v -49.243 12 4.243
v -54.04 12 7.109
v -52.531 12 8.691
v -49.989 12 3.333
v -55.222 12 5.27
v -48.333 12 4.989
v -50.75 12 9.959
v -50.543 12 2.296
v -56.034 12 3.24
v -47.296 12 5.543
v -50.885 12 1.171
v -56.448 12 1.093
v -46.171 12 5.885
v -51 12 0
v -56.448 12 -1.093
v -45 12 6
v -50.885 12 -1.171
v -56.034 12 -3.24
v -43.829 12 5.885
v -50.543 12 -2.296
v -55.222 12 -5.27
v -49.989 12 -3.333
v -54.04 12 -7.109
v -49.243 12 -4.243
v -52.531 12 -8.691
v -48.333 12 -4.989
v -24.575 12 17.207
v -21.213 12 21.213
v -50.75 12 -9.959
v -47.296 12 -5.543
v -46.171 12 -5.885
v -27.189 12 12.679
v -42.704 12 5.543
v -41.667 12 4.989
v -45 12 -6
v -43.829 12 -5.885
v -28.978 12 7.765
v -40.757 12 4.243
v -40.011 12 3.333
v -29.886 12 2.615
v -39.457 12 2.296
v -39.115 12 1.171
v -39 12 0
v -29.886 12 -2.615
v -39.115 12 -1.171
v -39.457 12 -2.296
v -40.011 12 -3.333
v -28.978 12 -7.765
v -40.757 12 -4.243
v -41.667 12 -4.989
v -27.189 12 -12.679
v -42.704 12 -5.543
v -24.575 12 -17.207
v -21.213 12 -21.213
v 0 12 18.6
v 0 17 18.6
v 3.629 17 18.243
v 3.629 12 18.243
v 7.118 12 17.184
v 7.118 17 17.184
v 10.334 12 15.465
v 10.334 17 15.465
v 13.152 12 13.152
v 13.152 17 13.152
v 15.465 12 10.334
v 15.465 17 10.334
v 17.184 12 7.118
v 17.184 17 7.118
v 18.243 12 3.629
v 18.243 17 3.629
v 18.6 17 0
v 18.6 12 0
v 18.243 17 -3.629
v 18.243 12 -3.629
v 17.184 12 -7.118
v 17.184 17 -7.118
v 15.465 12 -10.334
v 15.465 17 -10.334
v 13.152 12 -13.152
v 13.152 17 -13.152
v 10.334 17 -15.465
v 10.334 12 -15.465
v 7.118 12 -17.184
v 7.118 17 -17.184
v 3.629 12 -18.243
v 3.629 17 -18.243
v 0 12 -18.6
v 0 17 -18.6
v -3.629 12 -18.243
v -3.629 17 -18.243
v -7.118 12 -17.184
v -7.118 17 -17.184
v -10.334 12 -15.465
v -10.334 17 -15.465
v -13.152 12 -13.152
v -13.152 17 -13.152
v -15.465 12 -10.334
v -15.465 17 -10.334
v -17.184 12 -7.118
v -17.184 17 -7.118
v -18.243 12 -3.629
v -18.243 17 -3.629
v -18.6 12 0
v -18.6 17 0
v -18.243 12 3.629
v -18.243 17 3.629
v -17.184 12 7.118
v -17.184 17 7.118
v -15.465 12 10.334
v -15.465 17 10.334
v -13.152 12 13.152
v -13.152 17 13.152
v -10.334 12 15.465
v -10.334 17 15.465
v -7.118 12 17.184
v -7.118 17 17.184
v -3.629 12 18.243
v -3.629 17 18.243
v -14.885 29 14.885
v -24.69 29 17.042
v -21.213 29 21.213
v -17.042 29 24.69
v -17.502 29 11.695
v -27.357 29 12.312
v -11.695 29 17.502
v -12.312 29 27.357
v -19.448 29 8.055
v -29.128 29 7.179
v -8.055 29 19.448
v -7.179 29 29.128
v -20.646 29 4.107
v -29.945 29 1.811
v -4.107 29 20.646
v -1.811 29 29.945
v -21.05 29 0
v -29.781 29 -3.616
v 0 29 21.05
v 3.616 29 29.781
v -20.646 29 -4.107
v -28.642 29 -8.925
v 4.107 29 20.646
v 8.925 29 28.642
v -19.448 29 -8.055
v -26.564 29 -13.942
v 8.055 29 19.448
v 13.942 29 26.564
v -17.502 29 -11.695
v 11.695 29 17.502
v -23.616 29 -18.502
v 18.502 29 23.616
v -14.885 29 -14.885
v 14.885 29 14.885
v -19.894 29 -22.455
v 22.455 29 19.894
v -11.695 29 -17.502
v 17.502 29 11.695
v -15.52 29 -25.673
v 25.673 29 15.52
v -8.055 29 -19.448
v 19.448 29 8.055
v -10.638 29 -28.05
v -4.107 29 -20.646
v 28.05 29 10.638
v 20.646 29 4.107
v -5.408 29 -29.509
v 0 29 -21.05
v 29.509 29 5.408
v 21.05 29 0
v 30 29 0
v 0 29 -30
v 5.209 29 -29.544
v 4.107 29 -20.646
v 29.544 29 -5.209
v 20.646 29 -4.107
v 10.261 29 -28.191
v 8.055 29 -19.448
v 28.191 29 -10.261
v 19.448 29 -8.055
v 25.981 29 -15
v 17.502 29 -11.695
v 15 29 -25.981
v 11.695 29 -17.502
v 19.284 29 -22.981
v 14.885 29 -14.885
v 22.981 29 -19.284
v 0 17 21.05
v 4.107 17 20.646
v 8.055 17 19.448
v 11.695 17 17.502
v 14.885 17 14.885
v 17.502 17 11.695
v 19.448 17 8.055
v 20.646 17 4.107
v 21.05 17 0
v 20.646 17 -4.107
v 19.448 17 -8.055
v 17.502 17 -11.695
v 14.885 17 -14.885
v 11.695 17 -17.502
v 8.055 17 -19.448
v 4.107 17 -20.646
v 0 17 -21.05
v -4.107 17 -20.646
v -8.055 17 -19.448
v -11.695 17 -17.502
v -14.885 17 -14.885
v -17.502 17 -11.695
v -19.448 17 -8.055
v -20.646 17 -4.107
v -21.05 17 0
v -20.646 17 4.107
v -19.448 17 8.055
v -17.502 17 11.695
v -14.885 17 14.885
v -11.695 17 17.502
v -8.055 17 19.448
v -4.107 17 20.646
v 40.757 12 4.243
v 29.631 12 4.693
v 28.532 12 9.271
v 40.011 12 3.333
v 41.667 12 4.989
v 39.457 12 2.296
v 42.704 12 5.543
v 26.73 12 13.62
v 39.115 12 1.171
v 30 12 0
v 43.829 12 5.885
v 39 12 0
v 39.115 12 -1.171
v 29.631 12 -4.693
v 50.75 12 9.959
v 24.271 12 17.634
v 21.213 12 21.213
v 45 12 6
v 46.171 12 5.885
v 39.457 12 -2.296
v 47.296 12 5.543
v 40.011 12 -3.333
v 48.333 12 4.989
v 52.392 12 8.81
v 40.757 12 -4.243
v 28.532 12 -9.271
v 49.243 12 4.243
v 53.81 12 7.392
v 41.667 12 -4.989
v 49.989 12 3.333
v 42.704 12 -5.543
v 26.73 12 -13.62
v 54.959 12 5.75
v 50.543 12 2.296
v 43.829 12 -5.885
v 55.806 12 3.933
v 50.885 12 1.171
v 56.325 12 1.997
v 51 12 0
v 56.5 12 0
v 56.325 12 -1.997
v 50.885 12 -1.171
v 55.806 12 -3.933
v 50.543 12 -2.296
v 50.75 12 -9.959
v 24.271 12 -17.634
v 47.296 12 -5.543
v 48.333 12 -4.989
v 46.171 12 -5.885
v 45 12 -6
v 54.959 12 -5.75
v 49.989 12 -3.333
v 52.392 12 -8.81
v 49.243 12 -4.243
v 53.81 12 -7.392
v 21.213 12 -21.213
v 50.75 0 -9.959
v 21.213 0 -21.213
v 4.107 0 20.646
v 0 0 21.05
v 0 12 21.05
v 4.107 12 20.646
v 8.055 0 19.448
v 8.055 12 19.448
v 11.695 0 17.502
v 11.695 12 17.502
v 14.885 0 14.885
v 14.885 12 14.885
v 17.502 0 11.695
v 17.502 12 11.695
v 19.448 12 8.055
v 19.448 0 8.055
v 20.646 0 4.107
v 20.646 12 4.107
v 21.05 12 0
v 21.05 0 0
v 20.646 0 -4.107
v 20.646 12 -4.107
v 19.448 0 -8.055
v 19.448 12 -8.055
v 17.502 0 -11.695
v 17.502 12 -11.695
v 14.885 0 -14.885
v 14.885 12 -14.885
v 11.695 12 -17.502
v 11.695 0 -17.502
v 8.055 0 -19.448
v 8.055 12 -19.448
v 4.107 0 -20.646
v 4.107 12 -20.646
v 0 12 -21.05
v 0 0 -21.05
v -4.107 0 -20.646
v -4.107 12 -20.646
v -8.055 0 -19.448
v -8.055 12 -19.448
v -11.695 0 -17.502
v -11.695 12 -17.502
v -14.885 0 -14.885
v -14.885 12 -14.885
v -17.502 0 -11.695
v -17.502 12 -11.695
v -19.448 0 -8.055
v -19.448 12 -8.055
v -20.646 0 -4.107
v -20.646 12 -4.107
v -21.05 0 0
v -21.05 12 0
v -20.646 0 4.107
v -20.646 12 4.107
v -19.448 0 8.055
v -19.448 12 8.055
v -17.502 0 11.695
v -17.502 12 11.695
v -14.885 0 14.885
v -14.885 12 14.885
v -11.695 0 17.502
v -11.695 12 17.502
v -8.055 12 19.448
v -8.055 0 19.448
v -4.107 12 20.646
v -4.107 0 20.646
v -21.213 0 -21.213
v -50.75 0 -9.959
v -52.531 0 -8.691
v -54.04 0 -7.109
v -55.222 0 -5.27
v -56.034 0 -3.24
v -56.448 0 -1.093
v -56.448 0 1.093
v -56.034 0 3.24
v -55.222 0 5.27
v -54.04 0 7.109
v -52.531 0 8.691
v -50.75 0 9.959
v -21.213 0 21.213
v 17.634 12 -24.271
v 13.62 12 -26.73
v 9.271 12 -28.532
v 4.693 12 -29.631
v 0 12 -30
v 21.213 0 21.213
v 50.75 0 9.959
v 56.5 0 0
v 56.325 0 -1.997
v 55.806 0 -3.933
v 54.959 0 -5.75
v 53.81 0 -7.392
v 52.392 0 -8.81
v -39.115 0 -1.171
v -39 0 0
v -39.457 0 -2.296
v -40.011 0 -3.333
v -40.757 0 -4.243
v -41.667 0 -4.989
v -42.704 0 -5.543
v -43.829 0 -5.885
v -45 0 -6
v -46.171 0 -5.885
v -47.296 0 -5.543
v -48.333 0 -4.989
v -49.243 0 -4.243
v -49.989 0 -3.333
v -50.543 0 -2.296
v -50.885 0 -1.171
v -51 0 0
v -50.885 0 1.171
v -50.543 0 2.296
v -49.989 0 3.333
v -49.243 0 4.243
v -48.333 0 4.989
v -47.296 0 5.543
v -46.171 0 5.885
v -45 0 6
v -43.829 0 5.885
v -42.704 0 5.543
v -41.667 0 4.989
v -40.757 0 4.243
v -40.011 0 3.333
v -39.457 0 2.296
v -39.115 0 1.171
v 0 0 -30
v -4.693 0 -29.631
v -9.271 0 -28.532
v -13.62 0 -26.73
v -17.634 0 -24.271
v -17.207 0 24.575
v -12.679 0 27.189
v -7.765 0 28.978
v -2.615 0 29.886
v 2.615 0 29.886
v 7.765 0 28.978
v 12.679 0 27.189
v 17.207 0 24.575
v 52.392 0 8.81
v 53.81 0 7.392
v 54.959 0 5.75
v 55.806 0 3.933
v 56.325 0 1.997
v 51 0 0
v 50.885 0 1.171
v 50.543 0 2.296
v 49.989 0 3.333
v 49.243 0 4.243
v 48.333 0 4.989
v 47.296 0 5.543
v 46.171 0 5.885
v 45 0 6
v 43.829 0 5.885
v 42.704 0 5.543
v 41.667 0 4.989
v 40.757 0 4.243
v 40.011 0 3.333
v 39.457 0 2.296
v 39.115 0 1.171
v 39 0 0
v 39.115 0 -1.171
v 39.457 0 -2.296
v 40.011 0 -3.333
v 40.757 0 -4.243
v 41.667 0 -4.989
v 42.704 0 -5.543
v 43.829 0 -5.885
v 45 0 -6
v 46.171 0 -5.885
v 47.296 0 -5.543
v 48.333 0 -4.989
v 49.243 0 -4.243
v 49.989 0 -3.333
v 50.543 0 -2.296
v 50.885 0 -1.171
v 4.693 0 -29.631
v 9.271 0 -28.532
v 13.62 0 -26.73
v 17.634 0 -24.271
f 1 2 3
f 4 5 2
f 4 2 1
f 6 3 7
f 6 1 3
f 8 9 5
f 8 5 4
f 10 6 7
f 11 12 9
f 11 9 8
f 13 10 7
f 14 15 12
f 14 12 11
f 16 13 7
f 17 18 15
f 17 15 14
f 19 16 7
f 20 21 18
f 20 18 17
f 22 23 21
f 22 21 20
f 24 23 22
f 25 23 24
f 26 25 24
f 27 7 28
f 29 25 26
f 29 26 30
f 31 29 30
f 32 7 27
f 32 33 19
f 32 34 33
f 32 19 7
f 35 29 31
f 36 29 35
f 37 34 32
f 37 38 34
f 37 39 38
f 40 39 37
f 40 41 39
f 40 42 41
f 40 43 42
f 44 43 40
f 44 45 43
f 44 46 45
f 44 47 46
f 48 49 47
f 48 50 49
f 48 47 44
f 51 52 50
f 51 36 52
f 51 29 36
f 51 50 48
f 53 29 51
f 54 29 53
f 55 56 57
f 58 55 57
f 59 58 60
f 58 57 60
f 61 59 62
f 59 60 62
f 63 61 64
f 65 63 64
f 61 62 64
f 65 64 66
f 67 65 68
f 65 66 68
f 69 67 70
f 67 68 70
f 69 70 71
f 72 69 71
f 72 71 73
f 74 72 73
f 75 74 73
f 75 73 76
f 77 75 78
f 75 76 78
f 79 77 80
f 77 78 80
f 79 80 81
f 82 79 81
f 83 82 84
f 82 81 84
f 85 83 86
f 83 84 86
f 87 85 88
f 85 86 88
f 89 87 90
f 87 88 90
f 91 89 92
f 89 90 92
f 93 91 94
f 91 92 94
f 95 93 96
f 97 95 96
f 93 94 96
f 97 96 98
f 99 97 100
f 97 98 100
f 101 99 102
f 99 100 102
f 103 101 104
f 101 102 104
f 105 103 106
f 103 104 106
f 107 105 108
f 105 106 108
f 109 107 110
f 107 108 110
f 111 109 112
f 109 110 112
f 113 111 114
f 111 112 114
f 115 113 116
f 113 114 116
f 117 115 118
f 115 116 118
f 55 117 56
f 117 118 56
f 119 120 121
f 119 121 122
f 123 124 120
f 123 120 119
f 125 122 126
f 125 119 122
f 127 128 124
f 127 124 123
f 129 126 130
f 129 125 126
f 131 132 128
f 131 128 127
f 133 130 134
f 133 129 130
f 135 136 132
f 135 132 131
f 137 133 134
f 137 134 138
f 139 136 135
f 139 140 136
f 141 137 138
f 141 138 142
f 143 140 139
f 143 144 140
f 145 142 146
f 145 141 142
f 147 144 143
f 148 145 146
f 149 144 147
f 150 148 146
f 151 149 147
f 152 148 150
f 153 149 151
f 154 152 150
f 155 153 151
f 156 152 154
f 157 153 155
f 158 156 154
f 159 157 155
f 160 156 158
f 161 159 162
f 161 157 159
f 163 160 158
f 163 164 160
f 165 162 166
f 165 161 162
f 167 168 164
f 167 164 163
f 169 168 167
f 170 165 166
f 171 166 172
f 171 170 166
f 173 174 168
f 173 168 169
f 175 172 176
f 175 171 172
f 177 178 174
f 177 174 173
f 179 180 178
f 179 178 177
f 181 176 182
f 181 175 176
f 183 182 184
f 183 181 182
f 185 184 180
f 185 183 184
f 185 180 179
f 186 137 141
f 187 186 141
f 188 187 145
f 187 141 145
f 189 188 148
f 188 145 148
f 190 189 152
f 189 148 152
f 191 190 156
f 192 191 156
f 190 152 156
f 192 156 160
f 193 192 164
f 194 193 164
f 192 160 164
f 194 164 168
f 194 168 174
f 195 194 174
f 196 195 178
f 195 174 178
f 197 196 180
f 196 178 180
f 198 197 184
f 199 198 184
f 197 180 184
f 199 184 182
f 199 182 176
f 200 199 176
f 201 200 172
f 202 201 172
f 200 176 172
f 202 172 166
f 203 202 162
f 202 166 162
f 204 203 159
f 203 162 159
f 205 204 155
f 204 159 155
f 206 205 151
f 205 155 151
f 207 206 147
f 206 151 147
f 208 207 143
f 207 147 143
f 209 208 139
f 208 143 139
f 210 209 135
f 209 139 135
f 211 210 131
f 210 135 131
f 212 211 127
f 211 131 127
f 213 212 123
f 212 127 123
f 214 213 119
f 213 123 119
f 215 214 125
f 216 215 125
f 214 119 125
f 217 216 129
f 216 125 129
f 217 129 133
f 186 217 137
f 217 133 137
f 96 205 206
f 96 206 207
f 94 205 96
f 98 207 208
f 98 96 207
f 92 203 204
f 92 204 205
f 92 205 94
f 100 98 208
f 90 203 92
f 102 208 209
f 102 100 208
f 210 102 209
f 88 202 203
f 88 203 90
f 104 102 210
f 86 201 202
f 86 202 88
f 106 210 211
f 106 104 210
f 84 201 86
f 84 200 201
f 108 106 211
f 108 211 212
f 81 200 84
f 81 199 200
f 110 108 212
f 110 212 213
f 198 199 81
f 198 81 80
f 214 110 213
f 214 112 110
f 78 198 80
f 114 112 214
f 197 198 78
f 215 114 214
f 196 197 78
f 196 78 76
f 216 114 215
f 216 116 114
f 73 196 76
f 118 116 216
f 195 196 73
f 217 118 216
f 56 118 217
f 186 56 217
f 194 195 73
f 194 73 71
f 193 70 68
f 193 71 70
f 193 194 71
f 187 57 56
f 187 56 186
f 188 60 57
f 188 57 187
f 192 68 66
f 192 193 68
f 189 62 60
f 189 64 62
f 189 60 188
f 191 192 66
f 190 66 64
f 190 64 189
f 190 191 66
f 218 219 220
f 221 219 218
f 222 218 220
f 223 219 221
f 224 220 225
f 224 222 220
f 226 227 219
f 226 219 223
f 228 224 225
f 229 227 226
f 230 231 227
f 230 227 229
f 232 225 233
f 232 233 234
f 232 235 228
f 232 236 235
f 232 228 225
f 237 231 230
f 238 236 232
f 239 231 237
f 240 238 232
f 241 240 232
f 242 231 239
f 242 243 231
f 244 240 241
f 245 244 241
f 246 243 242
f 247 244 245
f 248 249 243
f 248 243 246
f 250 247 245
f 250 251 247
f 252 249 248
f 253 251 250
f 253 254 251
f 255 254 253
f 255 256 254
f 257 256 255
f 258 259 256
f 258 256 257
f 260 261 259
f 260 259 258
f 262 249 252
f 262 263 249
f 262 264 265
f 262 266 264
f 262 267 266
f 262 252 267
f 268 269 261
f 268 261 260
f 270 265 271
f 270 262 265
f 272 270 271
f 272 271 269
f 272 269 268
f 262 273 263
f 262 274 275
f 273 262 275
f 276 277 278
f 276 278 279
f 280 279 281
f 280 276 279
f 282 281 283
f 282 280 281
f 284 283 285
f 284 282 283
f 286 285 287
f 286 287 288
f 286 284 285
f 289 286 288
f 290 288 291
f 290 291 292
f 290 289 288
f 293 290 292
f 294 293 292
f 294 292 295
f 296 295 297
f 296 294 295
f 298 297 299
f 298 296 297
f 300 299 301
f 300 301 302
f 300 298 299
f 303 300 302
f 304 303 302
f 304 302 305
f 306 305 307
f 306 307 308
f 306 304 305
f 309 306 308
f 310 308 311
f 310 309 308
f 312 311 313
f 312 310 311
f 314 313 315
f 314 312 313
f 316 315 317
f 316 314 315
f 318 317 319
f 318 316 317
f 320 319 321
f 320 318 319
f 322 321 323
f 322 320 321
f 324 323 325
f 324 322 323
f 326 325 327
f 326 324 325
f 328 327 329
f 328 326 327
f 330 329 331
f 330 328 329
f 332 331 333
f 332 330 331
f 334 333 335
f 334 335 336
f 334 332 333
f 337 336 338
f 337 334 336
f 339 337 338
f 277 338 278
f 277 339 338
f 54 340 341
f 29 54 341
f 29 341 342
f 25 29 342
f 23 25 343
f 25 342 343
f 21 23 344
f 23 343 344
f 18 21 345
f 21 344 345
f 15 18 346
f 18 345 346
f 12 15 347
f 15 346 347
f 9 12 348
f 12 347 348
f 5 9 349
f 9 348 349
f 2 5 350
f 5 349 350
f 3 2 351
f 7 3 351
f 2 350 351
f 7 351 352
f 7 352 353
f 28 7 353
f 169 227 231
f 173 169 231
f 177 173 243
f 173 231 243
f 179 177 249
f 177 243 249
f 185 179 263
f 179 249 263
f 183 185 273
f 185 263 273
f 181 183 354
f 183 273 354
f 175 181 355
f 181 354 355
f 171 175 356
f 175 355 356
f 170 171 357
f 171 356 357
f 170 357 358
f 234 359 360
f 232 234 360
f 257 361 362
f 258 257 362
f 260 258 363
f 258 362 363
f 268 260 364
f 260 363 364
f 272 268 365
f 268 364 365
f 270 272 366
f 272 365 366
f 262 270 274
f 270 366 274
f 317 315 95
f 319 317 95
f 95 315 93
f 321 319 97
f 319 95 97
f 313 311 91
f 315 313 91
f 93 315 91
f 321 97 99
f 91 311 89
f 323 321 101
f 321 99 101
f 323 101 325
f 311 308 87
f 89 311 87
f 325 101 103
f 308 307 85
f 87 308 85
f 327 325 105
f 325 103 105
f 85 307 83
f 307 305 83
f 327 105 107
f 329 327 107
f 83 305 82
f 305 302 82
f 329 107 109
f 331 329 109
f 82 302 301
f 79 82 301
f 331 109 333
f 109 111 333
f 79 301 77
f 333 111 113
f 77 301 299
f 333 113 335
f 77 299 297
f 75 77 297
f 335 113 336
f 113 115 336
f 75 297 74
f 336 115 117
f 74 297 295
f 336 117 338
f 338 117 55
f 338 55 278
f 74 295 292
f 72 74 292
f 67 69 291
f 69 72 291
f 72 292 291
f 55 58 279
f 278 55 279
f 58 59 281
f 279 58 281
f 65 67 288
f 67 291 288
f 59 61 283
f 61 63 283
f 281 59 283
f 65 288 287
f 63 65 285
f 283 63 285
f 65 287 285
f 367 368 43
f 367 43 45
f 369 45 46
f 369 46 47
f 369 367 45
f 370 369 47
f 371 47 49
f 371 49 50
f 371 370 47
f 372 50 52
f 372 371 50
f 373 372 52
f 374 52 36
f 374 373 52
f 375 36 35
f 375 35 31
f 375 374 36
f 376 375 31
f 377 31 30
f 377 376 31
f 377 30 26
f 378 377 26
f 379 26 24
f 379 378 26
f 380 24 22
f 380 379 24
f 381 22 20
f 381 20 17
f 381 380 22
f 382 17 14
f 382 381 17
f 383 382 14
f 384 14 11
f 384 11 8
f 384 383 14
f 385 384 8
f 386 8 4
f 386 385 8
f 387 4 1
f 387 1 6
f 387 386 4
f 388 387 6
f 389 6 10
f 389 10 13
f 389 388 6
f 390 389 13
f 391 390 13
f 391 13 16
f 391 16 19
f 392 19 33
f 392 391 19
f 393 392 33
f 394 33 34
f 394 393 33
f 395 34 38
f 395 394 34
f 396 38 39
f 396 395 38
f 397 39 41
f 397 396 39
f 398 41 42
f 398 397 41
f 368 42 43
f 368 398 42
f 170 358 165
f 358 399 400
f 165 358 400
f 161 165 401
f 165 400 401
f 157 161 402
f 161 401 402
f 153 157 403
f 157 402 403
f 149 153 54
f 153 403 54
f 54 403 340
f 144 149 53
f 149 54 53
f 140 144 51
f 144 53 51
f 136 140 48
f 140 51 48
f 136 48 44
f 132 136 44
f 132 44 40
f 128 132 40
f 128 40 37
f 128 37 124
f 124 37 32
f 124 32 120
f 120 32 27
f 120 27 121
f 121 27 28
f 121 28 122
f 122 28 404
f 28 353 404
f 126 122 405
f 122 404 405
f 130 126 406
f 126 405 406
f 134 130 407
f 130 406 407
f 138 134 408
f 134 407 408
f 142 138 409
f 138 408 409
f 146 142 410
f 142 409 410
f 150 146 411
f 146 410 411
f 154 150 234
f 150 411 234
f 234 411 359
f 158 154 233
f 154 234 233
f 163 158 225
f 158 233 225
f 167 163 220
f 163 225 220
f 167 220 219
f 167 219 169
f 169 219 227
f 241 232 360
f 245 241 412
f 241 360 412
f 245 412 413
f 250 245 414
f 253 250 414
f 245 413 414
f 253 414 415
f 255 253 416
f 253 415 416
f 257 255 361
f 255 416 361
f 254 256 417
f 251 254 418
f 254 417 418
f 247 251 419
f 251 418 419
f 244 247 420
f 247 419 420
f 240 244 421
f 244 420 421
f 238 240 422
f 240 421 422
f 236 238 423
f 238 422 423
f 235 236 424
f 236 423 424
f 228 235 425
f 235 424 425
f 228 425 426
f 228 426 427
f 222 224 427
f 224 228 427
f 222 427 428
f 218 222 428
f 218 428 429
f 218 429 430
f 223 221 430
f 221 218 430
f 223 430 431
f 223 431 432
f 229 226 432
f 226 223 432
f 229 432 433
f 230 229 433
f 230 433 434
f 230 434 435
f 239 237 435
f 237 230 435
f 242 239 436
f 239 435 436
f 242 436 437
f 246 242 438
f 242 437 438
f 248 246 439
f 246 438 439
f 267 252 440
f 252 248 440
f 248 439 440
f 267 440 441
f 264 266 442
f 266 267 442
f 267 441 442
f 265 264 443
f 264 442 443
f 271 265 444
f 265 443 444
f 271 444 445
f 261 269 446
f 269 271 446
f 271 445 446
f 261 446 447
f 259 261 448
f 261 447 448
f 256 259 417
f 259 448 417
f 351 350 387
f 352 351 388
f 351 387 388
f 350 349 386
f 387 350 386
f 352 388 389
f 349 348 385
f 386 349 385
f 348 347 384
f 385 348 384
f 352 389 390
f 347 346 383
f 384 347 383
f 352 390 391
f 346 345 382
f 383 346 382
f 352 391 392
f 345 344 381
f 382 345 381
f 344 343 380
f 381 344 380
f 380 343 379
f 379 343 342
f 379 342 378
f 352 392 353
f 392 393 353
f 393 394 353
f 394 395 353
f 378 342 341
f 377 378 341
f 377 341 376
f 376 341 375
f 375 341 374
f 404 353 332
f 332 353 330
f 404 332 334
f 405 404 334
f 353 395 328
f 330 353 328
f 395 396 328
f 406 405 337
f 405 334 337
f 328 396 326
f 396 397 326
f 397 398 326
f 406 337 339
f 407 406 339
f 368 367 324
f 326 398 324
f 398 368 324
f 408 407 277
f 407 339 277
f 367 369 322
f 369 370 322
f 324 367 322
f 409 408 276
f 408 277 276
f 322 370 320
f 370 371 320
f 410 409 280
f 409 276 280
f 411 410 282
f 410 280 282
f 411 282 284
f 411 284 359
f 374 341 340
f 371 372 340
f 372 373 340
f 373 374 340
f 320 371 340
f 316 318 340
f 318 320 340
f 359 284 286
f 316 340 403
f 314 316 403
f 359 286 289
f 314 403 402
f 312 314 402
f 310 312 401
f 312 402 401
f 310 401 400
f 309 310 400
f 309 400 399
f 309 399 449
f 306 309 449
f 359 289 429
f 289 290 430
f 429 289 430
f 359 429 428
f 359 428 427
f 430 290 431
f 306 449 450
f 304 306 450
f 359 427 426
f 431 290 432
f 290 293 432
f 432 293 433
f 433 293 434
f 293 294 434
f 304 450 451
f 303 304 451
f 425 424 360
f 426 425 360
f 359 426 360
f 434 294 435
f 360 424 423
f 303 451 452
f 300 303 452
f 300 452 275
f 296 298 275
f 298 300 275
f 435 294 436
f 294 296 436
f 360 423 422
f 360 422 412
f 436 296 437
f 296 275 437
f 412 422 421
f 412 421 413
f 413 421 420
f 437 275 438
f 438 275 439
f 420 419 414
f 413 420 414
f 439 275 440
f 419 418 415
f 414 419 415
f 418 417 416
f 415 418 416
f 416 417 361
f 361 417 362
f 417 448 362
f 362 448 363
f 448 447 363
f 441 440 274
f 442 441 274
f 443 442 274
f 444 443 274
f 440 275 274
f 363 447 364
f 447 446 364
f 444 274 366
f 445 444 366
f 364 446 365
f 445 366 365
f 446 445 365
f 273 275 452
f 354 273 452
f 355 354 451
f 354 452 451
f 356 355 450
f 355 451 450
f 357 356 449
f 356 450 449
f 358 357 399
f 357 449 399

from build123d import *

# Parameters (mm, degrees)
BOSS_EXTRUDE2_DEPTH  = 12
BOSS_EXTRUDE3_DEPTH  = 17
MIRROR12_DEPTH       = 29
MIRROR12_2_OUTLINE_R = 6
MIRROR12_2_DEPTH     = 12
SKETCH4_R            = 21.05
CUT_EXTRUDE1_DEPTH   = 12
SKETCH5_R            = 18.6
CUT_EXTRUDE2_DEPTH   = 5


# Read off the part's stored shape, not the designer's step: Mirror12
with BuildPart() as part:
    # Sketch1 → Boss-Extrude2 (new body)
    with BuildSketch(Plane(origin=(0, 0, 0), x_dir=(1, 0, 0), z_dir=(0, 1, 0))):
        with BuildLine():
            Line((0, 30), (0, 0))
            Line((0, 0), (39, 0))
            ThreePointArc((39, 0), (45, 6), (51, 0))
            Line((51, 0), (56.5, 0))
            ThreePointArc((56.5, 0), (54.959292144, 5.75), (50.75, 9.959292144))
            Line((50.75, 9.959292144), (21.213203436, 21.213203436))
            ThreePointArc((21.213203436, 21.213203436), (11.480502971, 27.716385975), (0, 30))
        make_face()
    extrude(amount=BOSS_EXTRUDE2_DEPTH)

    # Sketch3 → Boss-Extrude3 (add)
    with BuildSketch(Plane(origin=(0, 12, 0), x_dir=(1, 0, 0), z_dir=(0, 1, 0))):
        with BuildLine():
            Line((0, 30), (0, 0))
            Line((0, 0), (30, 0))
            ThreePointArc((30, 0), (21.213203436, 21.213203436), (0, 30))
        make_face()
    extrude(amount=BOSS_EXTRUDE3_DEPTH)

    # Mirror12 outline → Mirror12 (add)
    with BuildSketch(Plane(origin=(0, 0, 0), x_dir=(1, 0, 0), z_dir=(0, 1, 0))):
        with BuildLine():
            ThreePointArc((0, 30), (-21.213203436, -21.213203436), (30, 0))
            Line((30, 0), (0, 0))
            Line((0, 0), (0, 30))
        make_face()
    extrude(amount=MIRROR12_DEPTH)

    # Mirror12 2 outline → Mirror12 2 (add)
    # profile 1 of 2: a face of its own
    with BuildSketch(Plane(origin=(0, 0, 0), x_dir=(1, 0, 0), z_dir=(0, 1, 0))):
        with BuildLine():
            Line((56.5, 0), (51, 0))
            ThreePointArc((51, 0), (45, -6), (39, 0))
            Line((39, 0), (30, 0))
            ThreePointArc((30, 0), (27.716385975, -11.480502971), (21.213203436, -21.213203436))
            Line((21.213203436, -21.213203436), (50.75, -9.959292144))
            ThreePointArc((50.75, -9.959292144), (54.959292144, -5.75), (56.5, 0))
        make_face()
    # profile 2 of 2: a face of its own
    with BuildSketch(Plane(origin=(0, 0, 0), x_dir=(1, 0, 0), z_dir=(0, 1, 0))):
        with BuildLine():
            ThreePointArc((-21.213203436, -21.213203436), (-30, 0), (-21.213203436, 21.213203436))
            Line((-21.213203436, 21.213203436), (-50.75, 9.959292144))
            ThreePointArc((-50.75, 9.959292144), (-56.5, 0), (-50.75, -9.959292144))
            Line((-50.75, -9.959292144), (-21.213203436, -21.213203436))
        make_face()
        with Locations((-45, 0)):
            Circle(MIRROR12_2_OUTLINE_R, mode=Mode.SUBTRACT)
    extrude(amount=MIRROR12_2_DEPTH)

    # Sketch4 → Cut-Extrude1 (cut)
    with BuildSketch(Plane(origin=(0, 29, 0), x_dir=(1, 0, 0), z_dir=(0, 1, 0))):
        with Locations(Location((0, 0, 0), (0, 0, 270))):
            Circle(SKETCH4_R)
    cut_extrude1 = extrude(amount=-CUT_EXTRUDE1_DEPTH, mode=Mode.SUBTRACT)

    # Mirror13: Cut-Extrude1 across plane
    add(cut_extrude1.mirror(Plane.ZX.offset(14.5)), mode=Mode.SUBTRACT)

    # Sketch5 → Cut-Extrude2 (cut)
    with BuildSketch(Plane(origin=(0, 17, 0), x_dir=(1, 0, 0), z_dir=(0, 1, 0))):
        with Locations(Location((0, 0, 0), (0, 0, 270))):
            Circle(SKETCH5_R)
    extrude(amount=-CUT_EXTRUDE2_DEPTH, mode=Mode.SUBTRACT)


solid = part.part
